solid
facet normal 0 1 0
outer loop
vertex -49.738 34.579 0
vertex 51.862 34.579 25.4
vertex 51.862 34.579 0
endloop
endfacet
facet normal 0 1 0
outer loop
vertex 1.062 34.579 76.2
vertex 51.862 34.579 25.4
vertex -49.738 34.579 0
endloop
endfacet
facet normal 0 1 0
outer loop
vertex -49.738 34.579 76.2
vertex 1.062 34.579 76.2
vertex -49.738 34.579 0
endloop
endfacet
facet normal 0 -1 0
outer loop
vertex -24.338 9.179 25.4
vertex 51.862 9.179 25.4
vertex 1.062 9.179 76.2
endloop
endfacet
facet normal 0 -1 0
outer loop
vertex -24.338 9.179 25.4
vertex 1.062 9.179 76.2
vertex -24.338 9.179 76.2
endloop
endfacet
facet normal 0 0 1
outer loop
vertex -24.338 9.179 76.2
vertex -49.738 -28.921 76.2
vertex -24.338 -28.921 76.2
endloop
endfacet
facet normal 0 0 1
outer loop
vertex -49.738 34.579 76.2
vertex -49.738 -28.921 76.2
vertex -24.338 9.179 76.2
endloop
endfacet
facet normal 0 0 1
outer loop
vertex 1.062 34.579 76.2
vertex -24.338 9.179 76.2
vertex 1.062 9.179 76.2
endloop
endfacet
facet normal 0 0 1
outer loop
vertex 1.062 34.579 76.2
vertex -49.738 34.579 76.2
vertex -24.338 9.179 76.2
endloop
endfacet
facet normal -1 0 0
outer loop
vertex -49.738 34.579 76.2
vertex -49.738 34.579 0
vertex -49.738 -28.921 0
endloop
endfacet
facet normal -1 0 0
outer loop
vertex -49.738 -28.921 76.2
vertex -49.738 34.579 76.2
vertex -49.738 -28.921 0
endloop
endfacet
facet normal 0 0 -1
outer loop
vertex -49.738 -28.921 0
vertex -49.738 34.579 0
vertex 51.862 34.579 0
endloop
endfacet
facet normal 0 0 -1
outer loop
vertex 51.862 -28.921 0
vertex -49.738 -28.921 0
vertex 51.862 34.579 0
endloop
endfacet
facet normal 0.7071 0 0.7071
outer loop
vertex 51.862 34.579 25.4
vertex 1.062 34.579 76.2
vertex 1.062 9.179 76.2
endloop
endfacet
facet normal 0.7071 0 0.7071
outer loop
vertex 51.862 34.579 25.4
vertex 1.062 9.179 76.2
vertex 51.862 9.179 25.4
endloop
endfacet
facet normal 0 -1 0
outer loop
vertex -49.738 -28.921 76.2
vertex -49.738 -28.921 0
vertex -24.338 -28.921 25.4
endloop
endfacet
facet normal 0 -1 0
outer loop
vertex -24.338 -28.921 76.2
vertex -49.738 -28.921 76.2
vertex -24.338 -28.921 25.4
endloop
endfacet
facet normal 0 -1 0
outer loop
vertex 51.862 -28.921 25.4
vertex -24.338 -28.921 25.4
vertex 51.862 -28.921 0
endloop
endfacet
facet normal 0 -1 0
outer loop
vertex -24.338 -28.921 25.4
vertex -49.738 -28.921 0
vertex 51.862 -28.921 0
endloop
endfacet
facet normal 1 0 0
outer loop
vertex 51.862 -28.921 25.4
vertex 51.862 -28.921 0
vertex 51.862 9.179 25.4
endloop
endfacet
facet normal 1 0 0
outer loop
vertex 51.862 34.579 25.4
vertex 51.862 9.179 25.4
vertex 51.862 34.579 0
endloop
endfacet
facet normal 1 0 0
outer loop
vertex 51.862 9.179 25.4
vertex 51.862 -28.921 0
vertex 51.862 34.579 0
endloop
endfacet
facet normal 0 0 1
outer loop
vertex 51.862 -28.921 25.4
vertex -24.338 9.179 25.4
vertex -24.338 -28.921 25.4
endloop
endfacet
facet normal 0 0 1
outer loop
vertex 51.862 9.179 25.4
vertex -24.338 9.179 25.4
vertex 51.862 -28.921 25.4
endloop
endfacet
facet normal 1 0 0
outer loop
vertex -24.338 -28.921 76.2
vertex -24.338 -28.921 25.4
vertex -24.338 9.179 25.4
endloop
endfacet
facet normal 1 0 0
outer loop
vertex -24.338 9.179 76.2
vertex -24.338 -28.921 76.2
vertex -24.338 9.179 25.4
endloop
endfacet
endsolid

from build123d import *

# Parameters (mm, degrees)
F0_W     = 101.6
F0_H     = 63.5
F1_DEPTH = 25.4
F3_DEPTH = 50.8
F5_DEPTH = 25.4


with BuildPart() as f1:
    # F0 (on Top) → F1 (new body)
    with BuildSketch(Plane.XY):
        with Locations((1.061673, 2.829394)):
            Rectangle(F0_W, F0_H)
    extrude(amount=F1_DEPTH)

    # F2 (on face) → F3 (join)
    with BuildSketch(Plane.XY.offset(25.4)):
        Polygon((-49.738327, 9.179394), (-49.738327, -28.920606), (-24.338327, -28.920606), (-24.338327, 9.179394), (1.061673, 9.179394), (1.061673, 34.579394), (-24.338327, 34.579394), (-49.738327, 34.579394), align=None)
    extrude(amount=F3_DEPTH)

    # F4 (on face) → F5 (join)
    with BuildSketch(Plane(origin=(0, 34.579394, 0), x_dir=(-1, 0, 0), z_dir=(0, 1, 0))):
        Polygon((-1.061673, 25.4), (-1.061673, 76.2), (-51.861673, 25.4), align=None)
    extrude(amount=-F5_DEPTH)


solid = f1.part
